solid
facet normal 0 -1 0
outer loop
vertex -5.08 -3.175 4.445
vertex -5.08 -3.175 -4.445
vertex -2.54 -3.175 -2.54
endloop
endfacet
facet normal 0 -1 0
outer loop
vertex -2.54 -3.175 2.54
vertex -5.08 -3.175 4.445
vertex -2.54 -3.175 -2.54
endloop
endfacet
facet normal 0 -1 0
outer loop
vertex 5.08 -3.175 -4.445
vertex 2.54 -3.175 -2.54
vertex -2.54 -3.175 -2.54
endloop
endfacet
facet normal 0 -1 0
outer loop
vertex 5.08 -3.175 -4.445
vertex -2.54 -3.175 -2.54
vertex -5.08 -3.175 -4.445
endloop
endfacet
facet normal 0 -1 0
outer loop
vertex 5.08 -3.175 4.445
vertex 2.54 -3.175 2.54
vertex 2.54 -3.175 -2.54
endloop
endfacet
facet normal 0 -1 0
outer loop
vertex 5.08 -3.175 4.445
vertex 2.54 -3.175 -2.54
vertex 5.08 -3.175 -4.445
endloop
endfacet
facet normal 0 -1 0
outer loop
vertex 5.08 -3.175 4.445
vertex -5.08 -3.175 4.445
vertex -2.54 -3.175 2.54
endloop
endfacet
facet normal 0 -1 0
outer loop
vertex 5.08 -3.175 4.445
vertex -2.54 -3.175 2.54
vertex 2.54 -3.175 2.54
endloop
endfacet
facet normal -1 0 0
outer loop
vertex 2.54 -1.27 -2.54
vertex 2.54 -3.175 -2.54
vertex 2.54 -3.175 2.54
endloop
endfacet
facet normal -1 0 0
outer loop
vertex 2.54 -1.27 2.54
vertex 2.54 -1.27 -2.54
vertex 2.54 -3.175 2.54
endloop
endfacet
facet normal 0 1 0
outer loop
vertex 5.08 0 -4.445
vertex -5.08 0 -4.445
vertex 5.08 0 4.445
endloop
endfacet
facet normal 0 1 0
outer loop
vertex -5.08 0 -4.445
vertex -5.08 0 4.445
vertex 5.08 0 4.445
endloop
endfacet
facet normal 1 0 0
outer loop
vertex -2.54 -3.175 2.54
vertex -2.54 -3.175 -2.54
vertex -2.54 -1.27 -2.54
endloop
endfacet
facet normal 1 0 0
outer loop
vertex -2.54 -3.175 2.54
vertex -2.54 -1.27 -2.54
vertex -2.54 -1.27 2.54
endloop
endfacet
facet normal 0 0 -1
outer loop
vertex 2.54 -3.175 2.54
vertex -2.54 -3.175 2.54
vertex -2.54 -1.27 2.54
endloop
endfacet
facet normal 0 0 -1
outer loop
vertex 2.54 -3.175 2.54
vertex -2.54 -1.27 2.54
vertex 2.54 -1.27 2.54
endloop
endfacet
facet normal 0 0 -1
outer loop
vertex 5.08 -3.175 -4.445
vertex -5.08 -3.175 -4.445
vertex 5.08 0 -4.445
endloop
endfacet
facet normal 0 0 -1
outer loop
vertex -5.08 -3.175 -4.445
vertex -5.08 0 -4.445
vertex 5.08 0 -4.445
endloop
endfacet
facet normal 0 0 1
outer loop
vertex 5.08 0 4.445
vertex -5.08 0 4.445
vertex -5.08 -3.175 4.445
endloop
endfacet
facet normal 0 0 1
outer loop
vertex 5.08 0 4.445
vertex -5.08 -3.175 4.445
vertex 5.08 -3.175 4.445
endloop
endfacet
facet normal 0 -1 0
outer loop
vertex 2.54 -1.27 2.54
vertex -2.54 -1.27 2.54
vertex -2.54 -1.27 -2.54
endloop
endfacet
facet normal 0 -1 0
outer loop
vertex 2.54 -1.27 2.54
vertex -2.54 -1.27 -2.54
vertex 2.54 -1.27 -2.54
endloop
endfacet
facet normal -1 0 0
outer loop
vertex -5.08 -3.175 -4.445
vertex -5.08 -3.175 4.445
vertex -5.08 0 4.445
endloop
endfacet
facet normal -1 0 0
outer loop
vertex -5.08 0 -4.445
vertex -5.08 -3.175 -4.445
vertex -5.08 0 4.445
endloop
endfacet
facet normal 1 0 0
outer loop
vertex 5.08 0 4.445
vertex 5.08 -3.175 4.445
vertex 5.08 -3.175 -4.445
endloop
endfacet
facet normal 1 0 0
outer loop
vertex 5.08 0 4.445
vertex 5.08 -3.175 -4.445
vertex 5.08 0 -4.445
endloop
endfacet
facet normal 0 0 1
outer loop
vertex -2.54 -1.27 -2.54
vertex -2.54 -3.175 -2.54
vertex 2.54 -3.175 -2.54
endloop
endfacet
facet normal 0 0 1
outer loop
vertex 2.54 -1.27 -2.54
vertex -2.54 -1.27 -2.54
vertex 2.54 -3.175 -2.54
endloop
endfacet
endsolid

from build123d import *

# Parameters (mm, degrees)
SKETCH1_W           = 10.16
SKETCH1_H           = 3.175
BOSS_EXTRUDE1_DEPTH = 4.445
SKETCH3_OUTSIDE_W   = 14.934
SKETCH3_OUTSIDE_H   = 13.664
SKETCH3_OUTSIDE_W_2 = 10.16
SKETCH3_OUTSIDE_H_2 = 8.89
SKETCH3_OUTSIDE_W_3 = 5.08
SKETCH3_OUTSIDE_H_3 = 5.08
CUT_EXTRUDE1_DEPTH  = 1.905


with BuildPart() as part:
    # Sketch1 → Boss-Extrude1 (new body, symmetric)
    with BuildSketch(Plane.XY):
        with Locations((0, -1.5875)):
            Rectangle(SKETCH1_W, SKETCH1_H)
    extrude(amount=BOSS_EXTRUDE1_DEPTH, both=True)

    # Sketch3 outside → Cut-Extrude1 (cut)
    with BuildSketch(Plane.XZ.offset(3.175)):
        Rectangle(SKETCH3_OUTSIDE_W, SKETCH3_OUTSIDE_H)
        Rectangle(SKETCH3_OUTSIDE_W_2, SKETCH3_OUTSIDE_H_2, mode=Mode.SUBTRACT)
        Rectangle(SKETCH3_OUTSIDE_W_3, SKETCH3_OUTSIDE_H_3)
    extrude(amount=-CUT_EXTRUDE1_DEPTH, mode=Mode.SUBTRACT)


solid = part.part
